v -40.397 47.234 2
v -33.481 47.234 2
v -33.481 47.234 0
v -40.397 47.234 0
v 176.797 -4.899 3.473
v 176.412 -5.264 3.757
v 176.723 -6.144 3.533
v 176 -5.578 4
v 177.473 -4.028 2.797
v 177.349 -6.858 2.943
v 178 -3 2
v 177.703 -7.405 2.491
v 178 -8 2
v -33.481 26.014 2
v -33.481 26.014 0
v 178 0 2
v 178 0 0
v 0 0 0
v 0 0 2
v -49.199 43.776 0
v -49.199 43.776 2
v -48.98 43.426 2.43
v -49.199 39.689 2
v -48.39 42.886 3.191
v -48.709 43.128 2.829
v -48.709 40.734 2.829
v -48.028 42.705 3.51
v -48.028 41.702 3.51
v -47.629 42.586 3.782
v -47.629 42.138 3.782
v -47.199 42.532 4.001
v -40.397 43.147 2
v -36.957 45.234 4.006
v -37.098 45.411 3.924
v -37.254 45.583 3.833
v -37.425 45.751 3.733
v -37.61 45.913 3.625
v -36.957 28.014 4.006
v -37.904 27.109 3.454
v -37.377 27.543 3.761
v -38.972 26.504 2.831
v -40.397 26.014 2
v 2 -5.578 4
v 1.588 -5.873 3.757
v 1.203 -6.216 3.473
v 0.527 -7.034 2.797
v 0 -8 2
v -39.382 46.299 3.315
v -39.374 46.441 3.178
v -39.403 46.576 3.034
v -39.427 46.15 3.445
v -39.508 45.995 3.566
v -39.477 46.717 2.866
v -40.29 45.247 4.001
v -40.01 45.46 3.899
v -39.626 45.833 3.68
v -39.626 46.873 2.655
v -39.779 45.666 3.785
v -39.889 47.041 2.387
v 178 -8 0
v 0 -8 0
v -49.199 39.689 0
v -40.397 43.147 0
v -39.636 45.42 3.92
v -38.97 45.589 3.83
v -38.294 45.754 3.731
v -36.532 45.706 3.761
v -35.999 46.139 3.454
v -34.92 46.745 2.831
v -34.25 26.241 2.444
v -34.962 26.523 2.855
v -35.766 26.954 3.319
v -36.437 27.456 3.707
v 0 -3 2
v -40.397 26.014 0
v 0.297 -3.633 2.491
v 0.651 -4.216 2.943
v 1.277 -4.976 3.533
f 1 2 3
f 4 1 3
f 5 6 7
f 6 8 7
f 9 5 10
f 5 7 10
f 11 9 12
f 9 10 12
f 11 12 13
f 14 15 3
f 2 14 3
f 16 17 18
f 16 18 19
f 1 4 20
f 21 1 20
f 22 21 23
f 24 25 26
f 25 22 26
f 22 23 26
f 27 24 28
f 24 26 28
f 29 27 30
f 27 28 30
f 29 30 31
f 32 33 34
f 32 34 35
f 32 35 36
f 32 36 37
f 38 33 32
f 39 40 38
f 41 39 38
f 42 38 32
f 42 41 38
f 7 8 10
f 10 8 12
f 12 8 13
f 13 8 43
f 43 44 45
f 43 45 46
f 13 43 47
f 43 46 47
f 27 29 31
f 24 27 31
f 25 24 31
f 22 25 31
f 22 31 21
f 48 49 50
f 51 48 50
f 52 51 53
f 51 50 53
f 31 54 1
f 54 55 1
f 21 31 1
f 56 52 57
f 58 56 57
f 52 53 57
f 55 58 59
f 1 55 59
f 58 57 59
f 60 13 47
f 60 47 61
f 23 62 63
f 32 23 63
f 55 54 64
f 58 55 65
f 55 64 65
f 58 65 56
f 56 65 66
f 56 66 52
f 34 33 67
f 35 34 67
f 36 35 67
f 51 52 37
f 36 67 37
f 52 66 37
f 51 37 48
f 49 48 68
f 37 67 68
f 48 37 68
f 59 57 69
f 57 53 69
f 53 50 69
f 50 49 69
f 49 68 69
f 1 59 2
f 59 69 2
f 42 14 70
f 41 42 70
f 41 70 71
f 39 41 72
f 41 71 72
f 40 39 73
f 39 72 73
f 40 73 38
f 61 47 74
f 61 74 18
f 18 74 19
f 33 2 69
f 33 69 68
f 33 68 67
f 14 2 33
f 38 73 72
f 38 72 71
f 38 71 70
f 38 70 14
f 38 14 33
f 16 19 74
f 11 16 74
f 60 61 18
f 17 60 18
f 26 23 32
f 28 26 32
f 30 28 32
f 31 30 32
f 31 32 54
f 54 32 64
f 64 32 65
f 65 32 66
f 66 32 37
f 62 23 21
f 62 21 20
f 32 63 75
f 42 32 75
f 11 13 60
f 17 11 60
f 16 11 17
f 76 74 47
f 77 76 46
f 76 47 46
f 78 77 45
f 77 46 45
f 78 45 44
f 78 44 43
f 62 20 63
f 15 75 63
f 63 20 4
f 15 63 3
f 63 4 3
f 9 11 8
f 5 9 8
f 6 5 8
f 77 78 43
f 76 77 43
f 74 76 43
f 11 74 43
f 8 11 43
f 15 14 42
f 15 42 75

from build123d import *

# Parameters (mm, degrees)
F1_DEPTH  = 178
F3_DEPTH  = 8
F5_DEPTH  = 2
F12_DEPTH = 19.5476922495
F14_DEPTH = 15.7185643911


with BuildPart() as f1:
    # F0 (on Right) → F1 (new body)
    with BuildSketch(Plane.YZ):
        Polygon((-8, 0), (0, 0), (0, 2), (-3, 2), (-5.5779432878, 4), (-8, 2), align=None)
    extrude(amount=F1_DEPTH)

    # F2 (on face) → F3 (cut, through all)
    with BuildSketch(Plane.XZ.offset(8)):
        with BuildLine():
            ThreePointArc((0, 2), (0.847681624, 3.152318376), (2, 4))
            Line((2, 4), (0, 4))
            Line((0, 4), (0, 2))
        make_face()
        with BuildLine():
            ThreePointArc((176, 4), (177.152318376, 3.152318376), (178, 2))
            Line((178, 2), (178, 4))
            Line((178, 4), (176, 4))
        make_face()
    extrude(amount=-F3_DEPTH, mode=Mode.SUBTRACT)


with BuildPart() as f5:
    # F4 (on Top) → F5 (new body)
    with BuildSketch(Plane.XY):
        Polygon((-33.4805399179, 47.2342856228), (-40.3967089951, 47.2342856228), (-49.1991043091, 43.7761992216), (-49.1991043091, 39.689373225), (-40.3967089951, 43.1474596262), (-40.3967089951, 26.0142218322), (-33.4805399179, 26.0142218322), align=None)
    extrude(amount=F5_DEPTH)

    # F9: sweep along a path in F7
    with BuildLine(Plane.XY.offset(4)) as f9_path:
        Line((-49.1991043091, 41.7327862233), (-36.9386244565, 46.5494068292))
    # F8 (on face) → F9 (sweep)
    with BuildSketch(Plane(origin=(-49.1991043091, 0, 0), x_dir=(0, -1, 0), z_dir=(-1, 0, 0))):
        Polygon((-41.7466796935, 4.0009669028), (-43.7761992216, 2), (-39.689373225, 2), align=None)
    sweep(path=f9_path.line)

    # F11: sweep along a path in F7
    with BuildLine(Plane.XY.offset(4)) as f11_path:
        Line((-36.9386244565, 47.2342856228), (-36.9386244565, 26.0142218322))
    # F10 (on face) → F11 (sweep)
    with BuildSketch(Plane.XZ.offset(-26.0142218322)):
        Polygon((-36.9565300643, 4.006314557), (-40.3967089951, 2), (-33.4805399179, 2), align=None)
    sweep(path=f11_path.line)

    # F10 (on face) → F12 (cut, up to face)
    with BuildSketch(Plane.XZ.offset(-26.0142218322)):
        with BuildLine():
            ThreePointArc((-49.1991043091, 2), (-48.3897429551, 3.1910299775), (-47.1991043091, 4.0009669028))
            Line((-47.1991043091, 4.0009669028), (-49.1991043091, 4.0009669028))
            Line((-49.1991043091, 4.0009669028), (-49.1991043091, 2))
        make_face()
    extrude(amount=-F12_DEPTH, mode=Mode.SUBTRACT)

    # F13 (on face) → F14 (cut, through all)
    with BuildSketch(Plane.YZ.offset(-33.4805399179)):
        with BuildLine():
            ThreePointArc((26.0142218322, 2), (26.8229801131, 3.1937970945), (28.0142218322, 4.006314557))
            Line((28.0142218322, 4.006314557), (26.0142218322, 4.006314557))
            Line((26.0142218322, 4.006314557), (26.0142218322, 2))
        make_face()
        with BuildLine():
            ThreePointArc((45.2342856228, 4.006314557), (46.4255273418, 3.1937970945), (47.2342856228, 2))
            Line((47.2342856228, 2), (48.8923490047, 2))
            Line((48.8923490047, 2), (48.8923490047, 4.006314557))
            Line((48.8923490047, 4.006314557), (45.2342856228, 4.006314557))
        make_face()
    extrude(amount=-F14_DEPTH, mode=Mode.SUBTRACT)


solid = Compound([f1.part, f5.part])
